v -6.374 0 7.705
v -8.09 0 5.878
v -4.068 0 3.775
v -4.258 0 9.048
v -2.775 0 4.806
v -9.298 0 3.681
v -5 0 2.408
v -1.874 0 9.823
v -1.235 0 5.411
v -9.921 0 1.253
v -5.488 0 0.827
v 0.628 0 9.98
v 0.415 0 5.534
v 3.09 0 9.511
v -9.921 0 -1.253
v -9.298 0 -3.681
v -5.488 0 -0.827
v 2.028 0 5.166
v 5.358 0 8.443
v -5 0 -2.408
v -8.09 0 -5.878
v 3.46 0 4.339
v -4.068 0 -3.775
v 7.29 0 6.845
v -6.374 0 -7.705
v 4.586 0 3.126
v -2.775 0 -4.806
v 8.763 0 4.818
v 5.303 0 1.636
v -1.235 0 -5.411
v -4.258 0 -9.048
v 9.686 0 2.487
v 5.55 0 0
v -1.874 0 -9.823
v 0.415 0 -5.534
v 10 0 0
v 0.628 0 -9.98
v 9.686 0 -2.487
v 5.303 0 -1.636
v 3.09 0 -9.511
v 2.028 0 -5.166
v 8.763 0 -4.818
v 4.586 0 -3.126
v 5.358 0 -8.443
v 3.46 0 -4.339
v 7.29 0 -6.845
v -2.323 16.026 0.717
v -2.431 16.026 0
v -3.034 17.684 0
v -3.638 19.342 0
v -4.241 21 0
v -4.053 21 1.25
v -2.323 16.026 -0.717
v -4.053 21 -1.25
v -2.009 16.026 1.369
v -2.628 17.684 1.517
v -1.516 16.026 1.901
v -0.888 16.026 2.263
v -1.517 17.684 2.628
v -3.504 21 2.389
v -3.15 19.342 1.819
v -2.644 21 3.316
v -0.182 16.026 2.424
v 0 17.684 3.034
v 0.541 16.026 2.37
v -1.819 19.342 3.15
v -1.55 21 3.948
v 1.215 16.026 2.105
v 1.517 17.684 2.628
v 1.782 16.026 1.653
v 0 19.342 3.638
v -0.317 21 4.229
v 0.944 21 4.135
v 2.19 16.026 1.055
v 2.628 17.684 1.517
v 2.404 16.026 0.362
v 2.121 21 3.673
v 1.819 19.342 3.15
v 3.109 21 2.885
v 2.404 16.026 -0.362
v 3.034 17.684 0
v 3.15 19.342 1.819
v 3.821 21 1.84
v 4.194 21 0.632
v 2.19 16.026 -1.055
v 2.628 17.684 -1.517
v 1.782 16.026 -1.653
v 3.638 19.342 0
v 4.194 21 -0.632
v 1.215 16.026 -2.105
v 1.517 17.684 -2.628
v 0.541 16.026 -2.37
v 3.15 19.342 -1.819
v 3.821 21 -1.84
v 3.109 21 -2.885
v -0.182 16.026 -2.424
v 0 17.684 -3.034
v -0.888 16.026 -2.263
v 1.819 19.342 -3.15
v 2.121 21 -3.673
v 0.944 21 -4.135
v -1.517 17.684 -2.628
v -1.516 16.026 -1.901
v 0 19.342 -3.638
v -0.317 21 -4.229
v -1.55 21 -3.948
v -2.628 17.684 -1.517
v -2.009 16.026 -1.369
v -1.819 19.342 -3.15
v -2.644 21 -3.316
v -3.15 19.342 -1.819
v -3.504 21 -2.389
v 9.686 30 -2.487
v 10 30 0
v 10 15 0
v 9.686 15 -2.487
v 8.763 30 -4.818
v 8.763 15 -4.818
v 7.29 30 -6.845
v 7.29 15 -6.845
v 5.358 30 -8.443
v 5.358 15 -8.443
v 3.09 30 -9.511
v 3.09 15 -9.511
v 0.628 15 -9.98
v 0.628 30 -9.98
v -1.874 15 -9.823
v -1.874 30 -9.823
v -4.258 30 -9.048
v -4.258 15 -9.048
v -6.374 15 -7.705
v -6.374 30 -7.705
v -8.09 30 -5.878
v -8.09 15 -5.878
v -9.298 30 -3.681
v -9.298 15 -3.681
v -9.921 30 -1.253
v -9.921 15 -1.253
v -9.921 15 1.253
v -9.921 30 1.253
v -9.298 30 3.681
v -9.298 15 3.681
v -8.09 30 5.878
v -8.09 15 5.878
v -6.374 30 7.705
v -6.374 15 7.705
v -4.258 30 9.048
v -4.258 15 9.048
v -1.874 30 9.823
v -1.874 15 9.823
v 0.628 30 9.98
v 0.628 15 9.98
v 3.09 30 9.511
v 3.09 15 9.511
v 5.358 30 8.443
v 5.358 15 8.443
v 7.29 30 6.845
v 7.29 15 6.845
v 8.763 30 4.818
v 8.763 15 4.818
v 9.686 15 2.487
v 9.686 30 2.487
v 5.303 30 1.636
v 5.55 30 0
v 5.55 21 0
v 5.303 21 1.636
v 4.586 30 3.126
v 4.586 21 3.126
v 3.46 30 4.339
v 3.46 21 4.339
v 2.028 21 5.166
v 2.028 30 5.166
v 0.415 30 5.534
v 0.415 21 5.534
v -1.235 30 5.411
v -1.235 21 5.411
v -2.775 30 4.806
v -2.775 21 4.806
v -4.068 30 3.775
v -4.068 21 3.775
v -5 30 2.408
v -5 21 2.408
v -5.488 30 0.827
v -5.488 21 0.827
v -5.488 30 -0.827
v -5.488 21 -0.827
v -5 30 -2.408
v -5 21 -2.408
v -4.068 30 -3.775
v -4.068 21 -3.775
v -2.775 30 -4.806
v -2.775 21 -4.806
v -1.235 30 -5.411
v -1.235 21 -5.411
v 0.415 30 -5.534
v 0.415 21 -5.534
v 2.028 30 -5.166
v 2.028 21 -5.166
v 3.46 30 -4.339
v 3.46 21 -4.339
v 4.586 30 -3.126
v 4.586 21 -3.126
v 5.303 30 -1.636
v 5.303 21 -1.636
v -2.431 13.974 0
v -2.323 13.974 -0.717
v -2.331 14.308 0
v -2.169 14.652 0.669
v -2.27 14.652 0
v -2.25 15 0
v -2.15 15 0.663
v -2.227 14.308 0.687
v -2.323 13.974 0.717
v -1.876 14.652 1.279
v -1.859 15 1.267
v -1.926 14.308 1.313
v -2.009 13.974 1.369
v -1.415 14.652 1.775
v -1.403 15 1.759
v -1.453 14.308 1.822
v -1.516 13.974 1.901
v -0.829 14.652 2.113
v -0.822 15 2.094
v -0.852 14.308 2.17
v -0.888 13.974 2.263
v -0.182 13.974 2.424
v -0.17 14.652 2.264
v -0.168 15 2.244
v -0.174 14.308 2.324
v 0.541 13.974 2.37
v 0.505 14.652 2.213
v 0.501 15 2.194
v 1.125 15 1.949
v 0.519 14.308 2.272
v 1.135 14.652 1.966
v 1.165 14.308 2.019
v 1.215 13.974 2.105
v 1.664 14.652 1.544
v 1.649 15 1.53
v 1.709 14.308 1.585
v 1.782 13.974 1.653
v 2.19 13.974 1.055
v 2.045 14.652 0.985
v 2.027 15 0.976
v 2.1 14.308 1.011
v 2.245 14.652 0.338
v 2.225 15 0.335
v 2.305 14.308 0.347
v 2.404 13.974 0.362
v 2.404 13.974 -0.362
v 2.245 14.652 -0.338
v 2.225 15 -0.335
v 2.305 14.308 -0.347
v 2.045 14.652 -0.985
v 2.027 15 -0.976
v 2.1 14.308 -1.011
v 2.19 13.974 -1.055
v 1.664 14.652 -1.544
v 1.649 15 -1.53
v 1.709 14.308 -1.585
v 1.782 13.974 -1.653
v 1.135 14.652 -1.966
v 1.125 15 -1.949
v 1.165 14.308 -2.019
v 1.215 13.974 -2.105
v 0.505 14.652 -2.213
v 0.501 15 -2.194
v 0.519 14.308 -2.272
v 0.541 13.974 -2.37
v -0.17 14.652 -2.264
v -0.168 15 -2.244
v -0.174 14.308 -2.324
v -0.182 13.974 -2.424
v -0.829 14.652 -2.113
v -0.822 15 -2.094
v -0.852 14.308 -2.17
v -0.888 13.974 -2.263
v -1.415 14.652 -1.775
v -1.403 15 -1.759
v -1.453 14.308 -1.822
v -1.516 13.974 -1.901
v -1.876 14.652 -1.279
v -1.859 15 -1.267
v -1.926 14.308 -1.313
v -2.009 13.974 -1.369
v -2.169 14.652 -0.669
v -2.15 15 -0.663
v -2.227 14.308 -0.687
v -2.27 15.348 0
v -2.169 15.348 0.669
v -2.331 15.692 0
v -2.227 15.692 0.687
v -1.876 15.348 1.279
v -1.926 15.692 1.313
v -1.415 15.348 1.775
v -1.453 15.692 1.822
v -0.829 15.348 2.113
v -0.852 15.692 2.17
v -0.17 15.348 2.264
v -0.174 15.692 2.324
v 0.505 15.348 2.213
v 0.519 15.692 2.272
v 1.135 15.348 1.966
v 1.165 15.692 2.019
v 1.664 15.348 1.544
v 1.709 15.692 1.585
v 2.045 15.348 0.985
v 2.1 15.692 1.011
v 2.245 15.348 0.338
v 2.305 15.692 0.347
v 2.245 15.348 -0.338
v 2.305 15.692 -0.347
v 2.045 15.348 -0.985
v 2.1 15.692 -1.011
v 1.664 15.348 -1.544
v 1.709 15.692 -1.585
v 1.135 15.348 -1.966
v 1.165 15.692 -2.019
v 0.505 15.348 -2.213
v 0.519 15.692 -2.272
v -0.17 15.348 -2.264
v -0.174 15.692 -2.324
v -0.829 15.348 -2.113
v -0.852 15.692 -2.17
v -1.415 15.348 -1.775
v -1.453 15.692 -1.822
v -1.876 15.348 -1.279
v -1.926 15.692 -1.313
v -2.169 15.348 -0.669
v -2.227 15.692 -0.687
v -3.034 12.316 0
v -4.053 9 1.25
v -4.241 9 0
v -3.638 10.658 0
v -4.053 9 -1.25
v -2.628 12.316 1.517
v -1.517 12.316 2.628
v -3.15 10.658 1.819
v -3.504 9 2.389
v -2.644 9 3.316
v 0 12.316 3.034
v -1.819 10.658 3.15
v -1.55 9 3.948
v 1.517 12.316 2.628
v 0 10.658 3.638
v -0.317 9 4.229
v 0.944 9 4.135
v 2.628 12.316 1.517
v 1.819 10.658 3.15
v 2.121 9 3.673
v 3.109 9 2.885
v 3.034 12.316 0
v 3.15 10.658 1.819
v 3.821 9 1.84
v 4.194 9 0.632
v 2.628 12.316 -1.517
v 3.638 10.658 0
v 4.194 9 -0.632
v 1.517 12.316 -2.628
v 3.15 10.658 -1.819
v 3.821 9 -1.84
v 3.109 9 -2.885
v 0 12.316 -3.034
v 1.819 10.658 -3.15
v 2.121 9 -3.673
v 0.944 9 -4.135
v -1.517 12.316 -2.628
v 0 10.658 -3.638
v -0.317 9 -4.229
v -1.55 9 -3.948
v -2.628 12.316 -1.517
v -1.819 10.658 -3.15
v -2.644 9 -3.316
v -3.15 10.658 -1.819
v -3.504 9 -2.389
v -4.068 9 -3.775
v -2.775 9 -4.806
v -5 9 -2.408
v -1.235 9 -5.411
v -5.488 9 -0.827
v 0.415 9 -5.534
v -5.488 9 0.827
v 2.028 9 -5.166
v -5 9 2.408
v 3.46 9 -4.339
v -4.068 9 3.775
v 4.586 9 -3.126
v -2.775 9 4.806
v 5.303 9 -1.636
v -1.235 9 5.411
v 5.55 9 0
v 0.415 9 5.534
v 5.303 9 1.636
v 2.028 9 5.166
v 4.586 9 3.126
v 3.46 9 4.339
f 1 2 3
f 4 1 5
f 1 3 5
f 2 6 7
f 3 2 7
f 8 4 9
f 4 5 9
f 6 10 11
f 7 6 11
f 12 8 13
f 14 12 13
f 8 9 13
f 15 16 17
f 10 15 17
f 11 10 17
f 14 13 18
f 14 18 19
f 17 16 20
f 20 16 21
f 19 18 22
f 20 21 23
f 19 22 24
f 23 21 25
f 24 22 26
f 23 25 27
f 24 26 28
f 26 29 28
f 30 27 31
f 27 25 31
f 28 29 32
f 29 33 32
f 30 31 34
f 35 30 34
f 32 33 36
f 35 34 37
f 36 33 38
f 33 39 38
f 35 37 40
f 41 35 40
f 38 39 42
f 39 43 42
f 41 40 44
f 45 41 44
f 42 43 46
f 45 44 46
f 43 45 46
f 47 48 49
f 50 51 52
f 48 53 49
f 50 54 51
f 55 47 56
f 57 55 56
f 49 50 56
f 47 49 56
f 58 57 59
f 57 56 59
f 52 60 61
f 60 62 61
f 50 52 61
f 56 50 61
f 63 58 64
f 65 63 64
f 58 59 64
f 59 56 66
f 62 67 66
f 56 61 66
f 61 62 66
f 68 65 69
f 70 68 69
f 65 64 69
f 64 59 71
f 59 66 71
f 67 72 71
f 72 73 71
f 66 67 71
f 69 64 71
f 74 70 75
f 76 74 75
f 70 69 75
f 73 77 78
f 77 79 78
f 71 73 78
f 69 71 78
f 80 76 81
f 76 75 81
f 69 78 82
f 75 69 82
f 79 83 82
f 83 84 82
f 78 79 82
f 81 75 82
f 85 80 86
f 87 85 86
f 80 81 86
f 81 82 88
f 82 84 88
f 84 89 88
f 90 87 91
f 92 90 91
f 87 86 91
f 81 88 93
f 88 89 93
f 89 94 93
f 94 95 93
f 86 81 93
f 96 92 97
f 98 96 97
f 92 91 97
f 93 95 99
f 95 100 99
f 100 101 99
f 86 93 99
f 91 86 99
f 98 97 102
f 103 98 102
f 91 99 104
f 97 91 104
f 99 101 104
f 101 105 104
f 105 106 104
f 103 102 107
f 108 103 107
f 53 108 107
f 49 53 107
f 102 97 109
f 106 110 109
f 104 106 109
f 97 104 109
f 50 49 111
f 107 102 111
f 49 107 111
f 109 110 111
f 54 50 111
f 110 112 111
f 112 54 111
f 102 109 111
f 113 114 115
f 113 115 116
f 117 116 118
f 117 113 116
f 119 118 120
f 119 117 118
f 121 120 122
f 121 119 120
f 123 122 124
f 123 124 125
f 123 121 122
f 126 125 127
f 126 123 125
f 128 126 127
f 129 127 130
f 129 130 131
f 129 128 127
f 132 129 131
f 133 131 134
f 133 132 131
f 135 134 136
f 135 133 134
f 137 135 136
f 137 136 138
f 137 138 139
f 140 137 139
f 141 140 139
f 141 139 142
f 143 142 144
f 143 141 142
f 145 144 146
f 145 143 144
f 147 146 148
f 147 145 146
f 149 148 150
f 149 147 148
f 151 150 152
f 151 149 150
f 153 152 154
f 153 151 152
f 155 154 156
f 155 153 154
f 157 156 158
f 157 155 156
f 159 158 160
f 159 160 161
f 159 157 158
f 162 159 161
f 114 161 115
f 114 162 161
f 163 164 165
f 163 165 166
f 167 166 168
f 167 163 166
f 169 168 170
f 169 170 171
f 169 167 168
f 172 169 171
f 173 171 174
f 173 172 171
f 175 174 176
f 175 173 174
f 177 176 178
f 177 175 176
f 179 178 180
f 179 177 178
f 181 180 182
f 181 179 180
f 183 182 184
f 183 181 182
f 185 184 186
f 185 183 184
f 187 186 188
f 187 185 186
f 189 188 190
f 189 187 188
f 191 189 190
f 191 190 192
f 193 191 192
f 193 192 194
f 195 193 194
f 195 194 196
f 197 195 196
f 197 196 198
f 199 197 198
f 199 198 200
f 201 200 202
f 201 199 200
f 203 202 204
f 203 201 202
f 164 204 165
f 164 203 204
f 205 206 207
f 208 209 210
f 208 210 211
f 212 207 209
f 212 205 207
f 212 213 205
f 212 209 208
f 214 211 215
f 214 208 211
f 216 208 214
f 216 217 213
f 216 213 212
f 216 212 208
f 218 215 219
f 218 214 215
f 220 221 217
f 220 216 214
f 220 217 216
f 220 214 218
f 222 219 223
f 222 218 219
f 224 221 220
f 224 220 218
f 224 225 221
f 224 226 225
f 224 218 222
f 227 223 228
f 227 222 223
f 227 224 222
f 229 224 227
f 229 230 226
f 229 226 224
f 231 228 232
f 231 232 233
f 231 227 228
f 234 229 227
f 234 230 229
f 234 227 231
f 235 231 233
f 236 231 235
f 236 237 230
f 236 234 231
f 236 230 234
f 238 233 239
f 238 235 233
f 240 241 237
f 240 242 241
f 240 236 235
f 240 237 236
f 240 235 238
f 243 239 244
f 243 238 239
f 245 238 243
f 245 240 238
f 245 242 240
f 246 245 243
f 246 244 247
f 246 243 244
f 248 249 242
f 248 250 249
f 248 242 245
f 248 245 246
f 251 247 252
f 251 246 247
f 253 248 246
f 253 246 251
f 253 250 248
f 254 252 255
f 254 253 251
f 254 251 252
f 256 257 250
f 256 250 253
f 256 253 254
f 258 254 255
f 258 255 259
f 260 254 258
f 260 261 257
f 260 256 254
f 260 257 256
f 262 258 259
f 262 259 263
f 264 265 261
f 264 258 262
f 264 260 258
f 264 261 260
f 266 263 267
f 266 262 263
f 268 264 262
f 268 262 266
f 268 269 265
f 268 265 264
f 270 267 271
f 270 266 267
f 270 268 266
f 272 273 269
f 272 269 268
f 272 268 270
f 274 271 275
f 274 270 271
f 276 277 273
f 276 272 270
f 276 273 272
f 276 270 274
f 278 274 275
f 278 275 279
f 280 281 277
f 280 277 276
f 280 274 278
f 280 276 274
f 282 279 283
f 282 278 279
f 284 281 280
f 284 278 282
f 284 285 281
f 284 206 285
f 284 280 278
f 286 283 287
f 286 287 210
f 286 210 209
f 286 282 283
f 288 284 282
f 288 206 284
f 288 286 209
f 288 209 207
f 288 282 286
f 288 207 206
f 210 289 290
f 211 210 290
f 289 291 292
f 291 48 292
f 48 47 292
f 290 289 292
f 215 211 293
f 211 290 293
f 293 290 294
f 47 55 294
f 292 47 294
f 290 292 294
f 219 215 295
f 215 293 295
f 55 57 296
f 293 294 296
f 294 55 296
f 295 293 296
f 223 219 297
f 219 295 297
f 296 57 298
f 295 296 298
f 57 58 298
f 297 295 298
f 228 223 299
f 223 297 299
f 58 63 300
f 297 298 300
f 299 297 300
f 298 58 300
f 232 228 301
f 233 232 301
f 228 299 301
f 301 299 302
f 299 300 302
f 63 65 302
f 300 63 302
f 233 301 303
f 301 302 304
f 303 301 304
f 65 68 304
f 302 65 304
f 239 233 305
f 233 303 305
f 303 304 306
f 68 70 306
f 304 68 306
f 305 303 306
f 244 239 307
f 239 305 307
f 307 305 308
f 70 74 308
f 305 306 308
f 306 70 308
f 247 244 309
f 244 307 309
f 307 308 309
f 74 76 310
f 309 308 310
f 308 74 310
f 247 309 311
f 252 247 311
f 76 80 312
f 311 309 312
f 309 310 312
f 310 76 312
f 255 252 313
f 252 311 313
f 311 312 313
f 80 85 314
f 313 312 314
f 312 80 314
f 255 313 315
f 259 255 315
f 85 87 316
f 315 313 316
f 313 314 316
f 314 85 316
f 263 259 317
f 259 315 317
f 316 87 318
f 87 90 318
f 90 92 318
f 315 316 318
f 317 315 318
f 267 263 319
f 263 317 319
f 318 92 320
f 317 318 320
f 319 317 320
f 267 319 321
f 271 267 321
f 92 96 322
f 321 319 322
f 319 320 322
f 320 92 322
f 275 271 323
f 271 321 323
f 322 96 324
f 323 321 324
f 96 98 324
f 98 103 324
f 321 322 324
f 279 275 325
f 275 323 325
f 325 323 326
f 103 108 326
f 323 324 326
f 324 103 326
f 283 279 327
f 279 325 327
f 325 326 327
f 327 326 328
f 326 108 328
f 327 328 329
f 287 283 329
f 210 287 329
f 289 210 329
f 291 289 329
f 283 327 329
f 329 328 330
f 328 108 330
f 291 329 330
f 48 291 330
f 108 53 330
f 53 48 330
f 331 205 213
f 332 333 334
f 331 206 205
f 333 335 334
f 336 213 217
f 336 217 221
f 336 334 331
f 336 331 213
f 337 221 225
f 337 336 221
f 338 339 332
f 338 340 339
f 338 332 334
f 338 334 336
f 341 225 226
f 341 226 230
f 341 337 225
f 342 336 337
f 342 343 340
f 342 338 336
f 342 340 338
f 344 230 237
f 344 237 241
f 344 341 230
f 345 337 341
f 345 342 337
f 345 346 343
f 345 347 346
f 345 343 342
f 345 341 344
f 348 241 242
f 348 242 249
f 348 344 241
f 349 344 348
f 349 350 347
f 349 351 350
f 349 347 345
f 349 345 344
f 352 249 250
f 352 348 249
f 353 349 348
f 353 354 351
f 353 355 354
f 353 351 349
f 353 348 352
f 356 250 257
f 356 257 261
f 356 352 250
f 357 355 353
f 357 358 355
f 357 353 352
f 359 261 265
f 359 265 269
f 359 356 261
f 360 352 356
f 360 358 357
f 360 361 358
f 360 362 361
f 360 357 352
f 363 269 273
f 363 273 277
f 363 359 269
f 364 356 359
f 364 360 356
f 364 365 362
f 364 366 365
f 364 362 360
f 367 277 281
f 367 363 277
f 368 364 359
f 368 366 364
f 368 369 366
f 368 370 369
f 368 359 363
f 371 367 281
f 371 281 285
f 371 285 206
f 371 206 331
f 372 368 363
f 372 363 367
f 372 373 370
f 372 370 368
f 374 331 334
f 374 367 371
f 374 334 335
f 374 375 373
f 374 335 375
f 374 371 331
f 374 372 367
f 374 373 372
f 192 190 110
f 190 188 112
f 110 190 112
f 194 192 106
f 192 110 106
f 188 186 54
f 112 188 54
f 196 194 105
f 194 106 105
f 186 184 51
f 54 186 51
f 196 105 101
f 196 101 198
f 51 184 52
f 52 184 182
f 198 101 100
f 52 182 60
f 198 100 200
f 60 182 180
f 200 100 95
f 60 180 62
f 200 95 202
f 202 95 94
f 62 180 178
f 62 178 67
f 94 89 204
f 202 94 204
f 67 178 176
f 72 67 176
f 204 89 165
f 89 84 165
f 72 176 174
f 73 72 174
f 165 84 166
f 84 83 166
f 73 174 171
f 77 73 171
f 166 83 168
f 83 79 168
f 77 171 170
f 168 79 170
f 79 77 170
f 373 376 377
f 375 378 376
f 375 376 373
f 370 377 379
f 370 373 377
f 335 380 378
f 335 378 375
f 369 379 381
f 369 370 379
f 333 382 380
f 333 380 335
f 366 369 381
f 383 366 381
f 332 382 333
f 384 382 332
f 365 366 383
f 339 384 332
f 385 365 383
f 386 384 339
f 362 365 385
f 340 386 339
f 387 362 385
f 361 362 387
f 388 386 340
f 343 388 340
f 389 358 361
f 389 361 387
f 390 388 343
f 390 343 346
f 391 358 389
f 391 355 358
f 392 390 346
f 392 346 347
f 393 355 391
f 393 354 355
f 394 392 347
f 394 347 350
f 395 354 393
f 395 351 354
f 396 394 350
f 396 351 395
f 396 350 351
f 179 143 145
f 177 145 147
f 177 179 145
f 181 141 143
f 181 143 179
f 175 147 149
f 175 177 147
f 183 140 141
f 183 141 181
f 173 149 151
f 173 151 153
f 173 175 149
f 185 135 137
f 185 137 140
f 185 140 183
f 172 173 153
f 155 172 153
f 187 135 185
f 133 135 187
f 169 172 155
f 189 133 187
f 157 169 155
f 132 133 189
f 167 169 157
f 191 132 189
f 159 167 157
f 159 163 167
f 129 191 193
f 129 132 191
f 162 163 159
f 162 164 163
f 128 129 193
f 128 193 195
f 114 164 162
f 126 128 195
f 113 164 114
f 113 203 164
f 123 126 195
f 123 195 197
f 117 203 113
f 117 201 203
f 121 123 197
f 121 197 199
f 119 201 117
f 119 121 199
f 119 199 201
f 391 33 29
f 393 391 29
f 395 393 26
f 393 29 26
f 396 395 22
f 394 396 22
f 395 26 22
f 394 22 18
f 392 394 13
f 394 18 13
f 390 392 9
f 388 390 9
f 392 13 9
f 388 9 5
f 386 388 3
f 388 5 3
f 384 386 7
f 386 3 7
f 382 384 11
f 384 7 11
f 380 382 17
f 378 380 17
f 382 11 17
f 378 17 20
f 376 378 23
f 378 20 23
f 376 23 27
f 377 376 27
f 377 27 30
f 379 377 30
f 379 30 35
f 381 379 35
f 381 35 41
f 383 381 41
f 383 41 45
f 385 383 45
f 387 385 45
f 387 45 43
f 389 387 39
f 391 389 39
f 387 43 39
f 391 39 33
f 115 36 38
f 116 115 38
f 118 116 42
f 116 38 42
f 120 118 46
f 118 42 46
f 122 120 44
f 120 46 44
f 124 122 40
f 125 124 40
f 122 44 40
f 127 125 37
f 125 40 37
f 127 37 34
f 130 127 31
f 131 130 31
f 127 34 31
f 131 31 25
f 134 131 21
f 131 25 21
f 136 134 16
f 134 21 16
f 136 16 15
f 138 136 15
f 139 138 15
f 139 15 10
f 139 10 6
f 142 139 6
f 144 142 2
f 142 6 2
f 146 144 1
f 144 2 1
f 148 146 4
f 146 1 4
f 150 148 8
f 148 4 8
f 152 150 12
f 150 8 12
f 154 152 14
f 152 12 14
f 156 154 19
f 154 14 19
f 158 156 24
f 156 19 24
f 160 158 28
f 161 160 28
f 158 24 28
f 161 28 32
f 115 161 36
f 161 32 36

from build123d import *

# Parameters (mm, degrees)
SKETCH1_R           = 10
BOSS_EXTRUDE1_DEPTH = 15
SKETCH2_R           = 5.55
CUT_EXTRUDE1_DEPTH  = 9


with BuildPart() as part:
    # Sketch1 → Boss-Extrude1 (new body)
    with BuildSketch(Plane(origin=(0, 0, 0), x_dir=(1, 0, 0), z_dir=(0, 1, 0))):
        Circle(SKETCH1_R)
    boss_extrude1 = extrude(amount=BOSS_EXTRUDE1_DEPTH)

    # Sketch2 → Cut-Extrude1 (cut)
    with BuildSketch(Plane.XZ):
        Circle(SKETCH2_R)
    cut_extrude1 = extrude(amount=-CUT_EXTRUDE1_DEPTH, mode=Mode.SUBTRACT)

    # Sketch3 → Cut-Revolve3 (revolve, cut)
    with BuildSketch(Plane.XY):
        with BuildLine():
            Line((-4.241288088, 9), (0, 9))
            Line((0, 9), (0, 15))
            Line((0, 15), (-2.25, 15))
            ThreePointArc((-2.25, 15), (-2.295576741, 14.479055467), (-2.430922138, 13.97393957))
            Line((-2.430922138, 13.97393957), (-4.241288088, 9))
        make_face()
    cut_revolve3 = revolve(axis=Axis((0, 15, 0), (0, 1, 0)), mode=Mode.SUBTRACT)

    # Mirror1: Boss-Extrude1, Cut-Extrude1, Cut-Revolve3 across plane
    add(boss_extrude1.mirror(Plane.ZX.offset(15)))
    add(cut_extrude1.mirror(Plane.ZX.offset(15)), mode=Mode.SUBTRACT)
    add(cut_revolve3.mirror(Plane.ZX.offset(15)), mode=Mode.SUBTRACT)


solid = part.part
